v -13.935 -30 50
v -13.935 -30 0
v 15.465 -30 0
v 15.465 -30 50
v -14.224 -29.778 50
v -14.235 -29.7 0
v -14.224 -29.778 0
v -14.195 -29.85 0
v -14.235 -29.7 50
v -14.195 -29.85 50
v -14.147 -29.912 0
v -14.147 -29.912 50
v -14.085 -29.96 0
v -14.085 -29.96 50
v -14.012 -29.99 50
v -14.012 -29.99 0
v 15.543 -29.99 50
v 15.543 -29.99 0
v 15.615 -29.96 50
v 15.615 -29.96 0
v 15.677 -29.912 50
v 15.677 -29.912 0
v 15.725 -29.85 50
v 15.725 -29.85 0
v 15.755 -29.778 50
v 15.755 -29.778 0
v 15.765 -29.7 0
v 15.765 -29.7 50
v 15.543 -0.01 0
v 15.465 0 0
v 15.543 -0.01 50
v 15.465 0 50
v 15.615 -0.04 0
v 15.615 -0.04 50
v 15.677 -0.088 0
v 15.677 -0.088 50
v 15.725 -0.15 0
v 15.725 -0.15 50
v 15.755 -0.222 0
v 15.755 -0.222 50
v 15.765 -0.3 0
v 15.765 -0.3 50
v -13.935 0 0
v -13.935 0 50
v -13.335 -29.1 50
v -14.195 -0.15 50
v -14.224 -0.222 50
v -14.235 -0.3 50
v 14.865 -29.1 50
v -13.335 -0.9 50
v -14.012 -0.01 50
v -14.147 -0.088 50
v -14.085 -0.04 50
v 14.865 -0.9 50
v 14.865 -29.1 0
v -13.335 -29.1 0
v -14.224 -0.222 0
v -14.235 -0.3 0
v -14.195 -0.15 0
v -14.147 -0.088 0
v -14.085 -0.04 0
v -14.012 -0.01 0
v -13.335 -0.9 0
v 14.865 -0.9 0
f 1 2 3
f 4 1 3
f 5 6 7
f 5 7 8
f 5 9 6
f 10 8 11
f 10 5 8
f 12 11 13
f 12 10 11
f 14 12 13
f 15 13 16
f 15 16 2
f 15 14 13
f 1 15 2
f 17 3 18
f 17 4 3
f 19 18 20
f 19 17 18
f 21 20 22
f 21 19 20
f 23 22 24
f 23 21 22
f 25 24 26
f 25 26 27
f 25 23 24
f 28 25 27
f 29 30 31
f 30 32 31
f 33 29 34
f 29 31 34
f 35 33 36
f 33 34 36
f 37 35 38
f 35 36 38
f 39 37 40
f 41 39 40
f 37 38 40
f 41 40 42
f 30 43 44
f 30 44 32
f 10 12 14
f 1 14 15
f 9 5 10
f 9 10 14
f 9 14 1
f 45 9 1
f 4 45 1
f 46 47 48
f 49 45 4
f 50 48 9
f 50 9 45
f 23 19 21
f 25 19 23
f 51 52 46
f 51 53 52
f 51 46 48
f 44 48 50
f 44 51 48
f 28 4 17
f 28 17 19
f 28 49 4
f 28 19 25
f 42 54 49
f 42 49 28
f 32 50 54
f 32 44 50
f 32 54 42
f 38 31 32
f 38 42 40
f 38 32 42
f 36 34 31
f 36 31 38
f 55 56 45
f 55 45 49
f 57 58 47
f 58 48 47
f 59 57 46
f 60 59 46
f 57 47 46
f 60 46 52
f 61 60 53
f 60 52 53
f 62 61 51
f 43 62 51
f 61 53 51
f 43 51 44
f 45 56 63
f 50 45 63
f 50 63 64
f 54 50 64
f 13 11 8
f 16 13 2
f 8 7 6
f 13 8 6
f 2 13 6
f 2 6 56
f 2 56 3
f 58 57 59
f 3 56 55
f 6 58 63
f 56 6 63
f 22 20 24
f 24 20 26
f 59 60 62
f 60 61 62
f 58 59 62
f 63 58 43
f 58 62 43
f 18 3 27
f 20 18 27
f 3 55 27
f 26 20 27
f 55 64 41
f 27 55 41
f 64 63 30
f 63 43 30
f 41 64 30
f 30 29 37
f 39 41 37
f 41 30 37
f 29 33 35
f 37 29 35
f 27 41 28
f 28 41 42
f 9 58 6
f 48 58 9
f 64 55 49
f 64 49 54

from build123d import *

# Parameters (mm, degrees)
F0_W     = 30
F0_H     = 50
F1_DEPTH = 30
F2_W     = 28.2
F2_H     = 28.2
F3_DEPTH = 50.001
F4_R     = 0.3


with BuildPart() as f1:
    # F0 (on Front) → F1 (new body)
    with BuildSketch(Plane.XZ):
        with Locations((0.765305, 25)):
            Rectangle(F0_W, F0_H)
    extrude(amount=F1_DEPTH)

    # F2 (on face) → F3 (cut, through all)
    with BuildSketch(Plane.XY.offset(50)):
        with Locations((0.765305, -15)):
            Rectangle(F2_W, F2_H)
    extrude(amount=-F3_DEPTH, mode=Mode.SUBTRACT)

    # F4
    f4_edges = [f1.edges().sort_by_distance(p)[0] for p in [
        (15.765305, -30, 25),
        (15.765305, 0, 25),
        (-14.234695, 0, 25),
        (-14.234695, -30, 25),
    ]]
    fillet(f4_edges, radius=F4_R)


solid = f1.part
